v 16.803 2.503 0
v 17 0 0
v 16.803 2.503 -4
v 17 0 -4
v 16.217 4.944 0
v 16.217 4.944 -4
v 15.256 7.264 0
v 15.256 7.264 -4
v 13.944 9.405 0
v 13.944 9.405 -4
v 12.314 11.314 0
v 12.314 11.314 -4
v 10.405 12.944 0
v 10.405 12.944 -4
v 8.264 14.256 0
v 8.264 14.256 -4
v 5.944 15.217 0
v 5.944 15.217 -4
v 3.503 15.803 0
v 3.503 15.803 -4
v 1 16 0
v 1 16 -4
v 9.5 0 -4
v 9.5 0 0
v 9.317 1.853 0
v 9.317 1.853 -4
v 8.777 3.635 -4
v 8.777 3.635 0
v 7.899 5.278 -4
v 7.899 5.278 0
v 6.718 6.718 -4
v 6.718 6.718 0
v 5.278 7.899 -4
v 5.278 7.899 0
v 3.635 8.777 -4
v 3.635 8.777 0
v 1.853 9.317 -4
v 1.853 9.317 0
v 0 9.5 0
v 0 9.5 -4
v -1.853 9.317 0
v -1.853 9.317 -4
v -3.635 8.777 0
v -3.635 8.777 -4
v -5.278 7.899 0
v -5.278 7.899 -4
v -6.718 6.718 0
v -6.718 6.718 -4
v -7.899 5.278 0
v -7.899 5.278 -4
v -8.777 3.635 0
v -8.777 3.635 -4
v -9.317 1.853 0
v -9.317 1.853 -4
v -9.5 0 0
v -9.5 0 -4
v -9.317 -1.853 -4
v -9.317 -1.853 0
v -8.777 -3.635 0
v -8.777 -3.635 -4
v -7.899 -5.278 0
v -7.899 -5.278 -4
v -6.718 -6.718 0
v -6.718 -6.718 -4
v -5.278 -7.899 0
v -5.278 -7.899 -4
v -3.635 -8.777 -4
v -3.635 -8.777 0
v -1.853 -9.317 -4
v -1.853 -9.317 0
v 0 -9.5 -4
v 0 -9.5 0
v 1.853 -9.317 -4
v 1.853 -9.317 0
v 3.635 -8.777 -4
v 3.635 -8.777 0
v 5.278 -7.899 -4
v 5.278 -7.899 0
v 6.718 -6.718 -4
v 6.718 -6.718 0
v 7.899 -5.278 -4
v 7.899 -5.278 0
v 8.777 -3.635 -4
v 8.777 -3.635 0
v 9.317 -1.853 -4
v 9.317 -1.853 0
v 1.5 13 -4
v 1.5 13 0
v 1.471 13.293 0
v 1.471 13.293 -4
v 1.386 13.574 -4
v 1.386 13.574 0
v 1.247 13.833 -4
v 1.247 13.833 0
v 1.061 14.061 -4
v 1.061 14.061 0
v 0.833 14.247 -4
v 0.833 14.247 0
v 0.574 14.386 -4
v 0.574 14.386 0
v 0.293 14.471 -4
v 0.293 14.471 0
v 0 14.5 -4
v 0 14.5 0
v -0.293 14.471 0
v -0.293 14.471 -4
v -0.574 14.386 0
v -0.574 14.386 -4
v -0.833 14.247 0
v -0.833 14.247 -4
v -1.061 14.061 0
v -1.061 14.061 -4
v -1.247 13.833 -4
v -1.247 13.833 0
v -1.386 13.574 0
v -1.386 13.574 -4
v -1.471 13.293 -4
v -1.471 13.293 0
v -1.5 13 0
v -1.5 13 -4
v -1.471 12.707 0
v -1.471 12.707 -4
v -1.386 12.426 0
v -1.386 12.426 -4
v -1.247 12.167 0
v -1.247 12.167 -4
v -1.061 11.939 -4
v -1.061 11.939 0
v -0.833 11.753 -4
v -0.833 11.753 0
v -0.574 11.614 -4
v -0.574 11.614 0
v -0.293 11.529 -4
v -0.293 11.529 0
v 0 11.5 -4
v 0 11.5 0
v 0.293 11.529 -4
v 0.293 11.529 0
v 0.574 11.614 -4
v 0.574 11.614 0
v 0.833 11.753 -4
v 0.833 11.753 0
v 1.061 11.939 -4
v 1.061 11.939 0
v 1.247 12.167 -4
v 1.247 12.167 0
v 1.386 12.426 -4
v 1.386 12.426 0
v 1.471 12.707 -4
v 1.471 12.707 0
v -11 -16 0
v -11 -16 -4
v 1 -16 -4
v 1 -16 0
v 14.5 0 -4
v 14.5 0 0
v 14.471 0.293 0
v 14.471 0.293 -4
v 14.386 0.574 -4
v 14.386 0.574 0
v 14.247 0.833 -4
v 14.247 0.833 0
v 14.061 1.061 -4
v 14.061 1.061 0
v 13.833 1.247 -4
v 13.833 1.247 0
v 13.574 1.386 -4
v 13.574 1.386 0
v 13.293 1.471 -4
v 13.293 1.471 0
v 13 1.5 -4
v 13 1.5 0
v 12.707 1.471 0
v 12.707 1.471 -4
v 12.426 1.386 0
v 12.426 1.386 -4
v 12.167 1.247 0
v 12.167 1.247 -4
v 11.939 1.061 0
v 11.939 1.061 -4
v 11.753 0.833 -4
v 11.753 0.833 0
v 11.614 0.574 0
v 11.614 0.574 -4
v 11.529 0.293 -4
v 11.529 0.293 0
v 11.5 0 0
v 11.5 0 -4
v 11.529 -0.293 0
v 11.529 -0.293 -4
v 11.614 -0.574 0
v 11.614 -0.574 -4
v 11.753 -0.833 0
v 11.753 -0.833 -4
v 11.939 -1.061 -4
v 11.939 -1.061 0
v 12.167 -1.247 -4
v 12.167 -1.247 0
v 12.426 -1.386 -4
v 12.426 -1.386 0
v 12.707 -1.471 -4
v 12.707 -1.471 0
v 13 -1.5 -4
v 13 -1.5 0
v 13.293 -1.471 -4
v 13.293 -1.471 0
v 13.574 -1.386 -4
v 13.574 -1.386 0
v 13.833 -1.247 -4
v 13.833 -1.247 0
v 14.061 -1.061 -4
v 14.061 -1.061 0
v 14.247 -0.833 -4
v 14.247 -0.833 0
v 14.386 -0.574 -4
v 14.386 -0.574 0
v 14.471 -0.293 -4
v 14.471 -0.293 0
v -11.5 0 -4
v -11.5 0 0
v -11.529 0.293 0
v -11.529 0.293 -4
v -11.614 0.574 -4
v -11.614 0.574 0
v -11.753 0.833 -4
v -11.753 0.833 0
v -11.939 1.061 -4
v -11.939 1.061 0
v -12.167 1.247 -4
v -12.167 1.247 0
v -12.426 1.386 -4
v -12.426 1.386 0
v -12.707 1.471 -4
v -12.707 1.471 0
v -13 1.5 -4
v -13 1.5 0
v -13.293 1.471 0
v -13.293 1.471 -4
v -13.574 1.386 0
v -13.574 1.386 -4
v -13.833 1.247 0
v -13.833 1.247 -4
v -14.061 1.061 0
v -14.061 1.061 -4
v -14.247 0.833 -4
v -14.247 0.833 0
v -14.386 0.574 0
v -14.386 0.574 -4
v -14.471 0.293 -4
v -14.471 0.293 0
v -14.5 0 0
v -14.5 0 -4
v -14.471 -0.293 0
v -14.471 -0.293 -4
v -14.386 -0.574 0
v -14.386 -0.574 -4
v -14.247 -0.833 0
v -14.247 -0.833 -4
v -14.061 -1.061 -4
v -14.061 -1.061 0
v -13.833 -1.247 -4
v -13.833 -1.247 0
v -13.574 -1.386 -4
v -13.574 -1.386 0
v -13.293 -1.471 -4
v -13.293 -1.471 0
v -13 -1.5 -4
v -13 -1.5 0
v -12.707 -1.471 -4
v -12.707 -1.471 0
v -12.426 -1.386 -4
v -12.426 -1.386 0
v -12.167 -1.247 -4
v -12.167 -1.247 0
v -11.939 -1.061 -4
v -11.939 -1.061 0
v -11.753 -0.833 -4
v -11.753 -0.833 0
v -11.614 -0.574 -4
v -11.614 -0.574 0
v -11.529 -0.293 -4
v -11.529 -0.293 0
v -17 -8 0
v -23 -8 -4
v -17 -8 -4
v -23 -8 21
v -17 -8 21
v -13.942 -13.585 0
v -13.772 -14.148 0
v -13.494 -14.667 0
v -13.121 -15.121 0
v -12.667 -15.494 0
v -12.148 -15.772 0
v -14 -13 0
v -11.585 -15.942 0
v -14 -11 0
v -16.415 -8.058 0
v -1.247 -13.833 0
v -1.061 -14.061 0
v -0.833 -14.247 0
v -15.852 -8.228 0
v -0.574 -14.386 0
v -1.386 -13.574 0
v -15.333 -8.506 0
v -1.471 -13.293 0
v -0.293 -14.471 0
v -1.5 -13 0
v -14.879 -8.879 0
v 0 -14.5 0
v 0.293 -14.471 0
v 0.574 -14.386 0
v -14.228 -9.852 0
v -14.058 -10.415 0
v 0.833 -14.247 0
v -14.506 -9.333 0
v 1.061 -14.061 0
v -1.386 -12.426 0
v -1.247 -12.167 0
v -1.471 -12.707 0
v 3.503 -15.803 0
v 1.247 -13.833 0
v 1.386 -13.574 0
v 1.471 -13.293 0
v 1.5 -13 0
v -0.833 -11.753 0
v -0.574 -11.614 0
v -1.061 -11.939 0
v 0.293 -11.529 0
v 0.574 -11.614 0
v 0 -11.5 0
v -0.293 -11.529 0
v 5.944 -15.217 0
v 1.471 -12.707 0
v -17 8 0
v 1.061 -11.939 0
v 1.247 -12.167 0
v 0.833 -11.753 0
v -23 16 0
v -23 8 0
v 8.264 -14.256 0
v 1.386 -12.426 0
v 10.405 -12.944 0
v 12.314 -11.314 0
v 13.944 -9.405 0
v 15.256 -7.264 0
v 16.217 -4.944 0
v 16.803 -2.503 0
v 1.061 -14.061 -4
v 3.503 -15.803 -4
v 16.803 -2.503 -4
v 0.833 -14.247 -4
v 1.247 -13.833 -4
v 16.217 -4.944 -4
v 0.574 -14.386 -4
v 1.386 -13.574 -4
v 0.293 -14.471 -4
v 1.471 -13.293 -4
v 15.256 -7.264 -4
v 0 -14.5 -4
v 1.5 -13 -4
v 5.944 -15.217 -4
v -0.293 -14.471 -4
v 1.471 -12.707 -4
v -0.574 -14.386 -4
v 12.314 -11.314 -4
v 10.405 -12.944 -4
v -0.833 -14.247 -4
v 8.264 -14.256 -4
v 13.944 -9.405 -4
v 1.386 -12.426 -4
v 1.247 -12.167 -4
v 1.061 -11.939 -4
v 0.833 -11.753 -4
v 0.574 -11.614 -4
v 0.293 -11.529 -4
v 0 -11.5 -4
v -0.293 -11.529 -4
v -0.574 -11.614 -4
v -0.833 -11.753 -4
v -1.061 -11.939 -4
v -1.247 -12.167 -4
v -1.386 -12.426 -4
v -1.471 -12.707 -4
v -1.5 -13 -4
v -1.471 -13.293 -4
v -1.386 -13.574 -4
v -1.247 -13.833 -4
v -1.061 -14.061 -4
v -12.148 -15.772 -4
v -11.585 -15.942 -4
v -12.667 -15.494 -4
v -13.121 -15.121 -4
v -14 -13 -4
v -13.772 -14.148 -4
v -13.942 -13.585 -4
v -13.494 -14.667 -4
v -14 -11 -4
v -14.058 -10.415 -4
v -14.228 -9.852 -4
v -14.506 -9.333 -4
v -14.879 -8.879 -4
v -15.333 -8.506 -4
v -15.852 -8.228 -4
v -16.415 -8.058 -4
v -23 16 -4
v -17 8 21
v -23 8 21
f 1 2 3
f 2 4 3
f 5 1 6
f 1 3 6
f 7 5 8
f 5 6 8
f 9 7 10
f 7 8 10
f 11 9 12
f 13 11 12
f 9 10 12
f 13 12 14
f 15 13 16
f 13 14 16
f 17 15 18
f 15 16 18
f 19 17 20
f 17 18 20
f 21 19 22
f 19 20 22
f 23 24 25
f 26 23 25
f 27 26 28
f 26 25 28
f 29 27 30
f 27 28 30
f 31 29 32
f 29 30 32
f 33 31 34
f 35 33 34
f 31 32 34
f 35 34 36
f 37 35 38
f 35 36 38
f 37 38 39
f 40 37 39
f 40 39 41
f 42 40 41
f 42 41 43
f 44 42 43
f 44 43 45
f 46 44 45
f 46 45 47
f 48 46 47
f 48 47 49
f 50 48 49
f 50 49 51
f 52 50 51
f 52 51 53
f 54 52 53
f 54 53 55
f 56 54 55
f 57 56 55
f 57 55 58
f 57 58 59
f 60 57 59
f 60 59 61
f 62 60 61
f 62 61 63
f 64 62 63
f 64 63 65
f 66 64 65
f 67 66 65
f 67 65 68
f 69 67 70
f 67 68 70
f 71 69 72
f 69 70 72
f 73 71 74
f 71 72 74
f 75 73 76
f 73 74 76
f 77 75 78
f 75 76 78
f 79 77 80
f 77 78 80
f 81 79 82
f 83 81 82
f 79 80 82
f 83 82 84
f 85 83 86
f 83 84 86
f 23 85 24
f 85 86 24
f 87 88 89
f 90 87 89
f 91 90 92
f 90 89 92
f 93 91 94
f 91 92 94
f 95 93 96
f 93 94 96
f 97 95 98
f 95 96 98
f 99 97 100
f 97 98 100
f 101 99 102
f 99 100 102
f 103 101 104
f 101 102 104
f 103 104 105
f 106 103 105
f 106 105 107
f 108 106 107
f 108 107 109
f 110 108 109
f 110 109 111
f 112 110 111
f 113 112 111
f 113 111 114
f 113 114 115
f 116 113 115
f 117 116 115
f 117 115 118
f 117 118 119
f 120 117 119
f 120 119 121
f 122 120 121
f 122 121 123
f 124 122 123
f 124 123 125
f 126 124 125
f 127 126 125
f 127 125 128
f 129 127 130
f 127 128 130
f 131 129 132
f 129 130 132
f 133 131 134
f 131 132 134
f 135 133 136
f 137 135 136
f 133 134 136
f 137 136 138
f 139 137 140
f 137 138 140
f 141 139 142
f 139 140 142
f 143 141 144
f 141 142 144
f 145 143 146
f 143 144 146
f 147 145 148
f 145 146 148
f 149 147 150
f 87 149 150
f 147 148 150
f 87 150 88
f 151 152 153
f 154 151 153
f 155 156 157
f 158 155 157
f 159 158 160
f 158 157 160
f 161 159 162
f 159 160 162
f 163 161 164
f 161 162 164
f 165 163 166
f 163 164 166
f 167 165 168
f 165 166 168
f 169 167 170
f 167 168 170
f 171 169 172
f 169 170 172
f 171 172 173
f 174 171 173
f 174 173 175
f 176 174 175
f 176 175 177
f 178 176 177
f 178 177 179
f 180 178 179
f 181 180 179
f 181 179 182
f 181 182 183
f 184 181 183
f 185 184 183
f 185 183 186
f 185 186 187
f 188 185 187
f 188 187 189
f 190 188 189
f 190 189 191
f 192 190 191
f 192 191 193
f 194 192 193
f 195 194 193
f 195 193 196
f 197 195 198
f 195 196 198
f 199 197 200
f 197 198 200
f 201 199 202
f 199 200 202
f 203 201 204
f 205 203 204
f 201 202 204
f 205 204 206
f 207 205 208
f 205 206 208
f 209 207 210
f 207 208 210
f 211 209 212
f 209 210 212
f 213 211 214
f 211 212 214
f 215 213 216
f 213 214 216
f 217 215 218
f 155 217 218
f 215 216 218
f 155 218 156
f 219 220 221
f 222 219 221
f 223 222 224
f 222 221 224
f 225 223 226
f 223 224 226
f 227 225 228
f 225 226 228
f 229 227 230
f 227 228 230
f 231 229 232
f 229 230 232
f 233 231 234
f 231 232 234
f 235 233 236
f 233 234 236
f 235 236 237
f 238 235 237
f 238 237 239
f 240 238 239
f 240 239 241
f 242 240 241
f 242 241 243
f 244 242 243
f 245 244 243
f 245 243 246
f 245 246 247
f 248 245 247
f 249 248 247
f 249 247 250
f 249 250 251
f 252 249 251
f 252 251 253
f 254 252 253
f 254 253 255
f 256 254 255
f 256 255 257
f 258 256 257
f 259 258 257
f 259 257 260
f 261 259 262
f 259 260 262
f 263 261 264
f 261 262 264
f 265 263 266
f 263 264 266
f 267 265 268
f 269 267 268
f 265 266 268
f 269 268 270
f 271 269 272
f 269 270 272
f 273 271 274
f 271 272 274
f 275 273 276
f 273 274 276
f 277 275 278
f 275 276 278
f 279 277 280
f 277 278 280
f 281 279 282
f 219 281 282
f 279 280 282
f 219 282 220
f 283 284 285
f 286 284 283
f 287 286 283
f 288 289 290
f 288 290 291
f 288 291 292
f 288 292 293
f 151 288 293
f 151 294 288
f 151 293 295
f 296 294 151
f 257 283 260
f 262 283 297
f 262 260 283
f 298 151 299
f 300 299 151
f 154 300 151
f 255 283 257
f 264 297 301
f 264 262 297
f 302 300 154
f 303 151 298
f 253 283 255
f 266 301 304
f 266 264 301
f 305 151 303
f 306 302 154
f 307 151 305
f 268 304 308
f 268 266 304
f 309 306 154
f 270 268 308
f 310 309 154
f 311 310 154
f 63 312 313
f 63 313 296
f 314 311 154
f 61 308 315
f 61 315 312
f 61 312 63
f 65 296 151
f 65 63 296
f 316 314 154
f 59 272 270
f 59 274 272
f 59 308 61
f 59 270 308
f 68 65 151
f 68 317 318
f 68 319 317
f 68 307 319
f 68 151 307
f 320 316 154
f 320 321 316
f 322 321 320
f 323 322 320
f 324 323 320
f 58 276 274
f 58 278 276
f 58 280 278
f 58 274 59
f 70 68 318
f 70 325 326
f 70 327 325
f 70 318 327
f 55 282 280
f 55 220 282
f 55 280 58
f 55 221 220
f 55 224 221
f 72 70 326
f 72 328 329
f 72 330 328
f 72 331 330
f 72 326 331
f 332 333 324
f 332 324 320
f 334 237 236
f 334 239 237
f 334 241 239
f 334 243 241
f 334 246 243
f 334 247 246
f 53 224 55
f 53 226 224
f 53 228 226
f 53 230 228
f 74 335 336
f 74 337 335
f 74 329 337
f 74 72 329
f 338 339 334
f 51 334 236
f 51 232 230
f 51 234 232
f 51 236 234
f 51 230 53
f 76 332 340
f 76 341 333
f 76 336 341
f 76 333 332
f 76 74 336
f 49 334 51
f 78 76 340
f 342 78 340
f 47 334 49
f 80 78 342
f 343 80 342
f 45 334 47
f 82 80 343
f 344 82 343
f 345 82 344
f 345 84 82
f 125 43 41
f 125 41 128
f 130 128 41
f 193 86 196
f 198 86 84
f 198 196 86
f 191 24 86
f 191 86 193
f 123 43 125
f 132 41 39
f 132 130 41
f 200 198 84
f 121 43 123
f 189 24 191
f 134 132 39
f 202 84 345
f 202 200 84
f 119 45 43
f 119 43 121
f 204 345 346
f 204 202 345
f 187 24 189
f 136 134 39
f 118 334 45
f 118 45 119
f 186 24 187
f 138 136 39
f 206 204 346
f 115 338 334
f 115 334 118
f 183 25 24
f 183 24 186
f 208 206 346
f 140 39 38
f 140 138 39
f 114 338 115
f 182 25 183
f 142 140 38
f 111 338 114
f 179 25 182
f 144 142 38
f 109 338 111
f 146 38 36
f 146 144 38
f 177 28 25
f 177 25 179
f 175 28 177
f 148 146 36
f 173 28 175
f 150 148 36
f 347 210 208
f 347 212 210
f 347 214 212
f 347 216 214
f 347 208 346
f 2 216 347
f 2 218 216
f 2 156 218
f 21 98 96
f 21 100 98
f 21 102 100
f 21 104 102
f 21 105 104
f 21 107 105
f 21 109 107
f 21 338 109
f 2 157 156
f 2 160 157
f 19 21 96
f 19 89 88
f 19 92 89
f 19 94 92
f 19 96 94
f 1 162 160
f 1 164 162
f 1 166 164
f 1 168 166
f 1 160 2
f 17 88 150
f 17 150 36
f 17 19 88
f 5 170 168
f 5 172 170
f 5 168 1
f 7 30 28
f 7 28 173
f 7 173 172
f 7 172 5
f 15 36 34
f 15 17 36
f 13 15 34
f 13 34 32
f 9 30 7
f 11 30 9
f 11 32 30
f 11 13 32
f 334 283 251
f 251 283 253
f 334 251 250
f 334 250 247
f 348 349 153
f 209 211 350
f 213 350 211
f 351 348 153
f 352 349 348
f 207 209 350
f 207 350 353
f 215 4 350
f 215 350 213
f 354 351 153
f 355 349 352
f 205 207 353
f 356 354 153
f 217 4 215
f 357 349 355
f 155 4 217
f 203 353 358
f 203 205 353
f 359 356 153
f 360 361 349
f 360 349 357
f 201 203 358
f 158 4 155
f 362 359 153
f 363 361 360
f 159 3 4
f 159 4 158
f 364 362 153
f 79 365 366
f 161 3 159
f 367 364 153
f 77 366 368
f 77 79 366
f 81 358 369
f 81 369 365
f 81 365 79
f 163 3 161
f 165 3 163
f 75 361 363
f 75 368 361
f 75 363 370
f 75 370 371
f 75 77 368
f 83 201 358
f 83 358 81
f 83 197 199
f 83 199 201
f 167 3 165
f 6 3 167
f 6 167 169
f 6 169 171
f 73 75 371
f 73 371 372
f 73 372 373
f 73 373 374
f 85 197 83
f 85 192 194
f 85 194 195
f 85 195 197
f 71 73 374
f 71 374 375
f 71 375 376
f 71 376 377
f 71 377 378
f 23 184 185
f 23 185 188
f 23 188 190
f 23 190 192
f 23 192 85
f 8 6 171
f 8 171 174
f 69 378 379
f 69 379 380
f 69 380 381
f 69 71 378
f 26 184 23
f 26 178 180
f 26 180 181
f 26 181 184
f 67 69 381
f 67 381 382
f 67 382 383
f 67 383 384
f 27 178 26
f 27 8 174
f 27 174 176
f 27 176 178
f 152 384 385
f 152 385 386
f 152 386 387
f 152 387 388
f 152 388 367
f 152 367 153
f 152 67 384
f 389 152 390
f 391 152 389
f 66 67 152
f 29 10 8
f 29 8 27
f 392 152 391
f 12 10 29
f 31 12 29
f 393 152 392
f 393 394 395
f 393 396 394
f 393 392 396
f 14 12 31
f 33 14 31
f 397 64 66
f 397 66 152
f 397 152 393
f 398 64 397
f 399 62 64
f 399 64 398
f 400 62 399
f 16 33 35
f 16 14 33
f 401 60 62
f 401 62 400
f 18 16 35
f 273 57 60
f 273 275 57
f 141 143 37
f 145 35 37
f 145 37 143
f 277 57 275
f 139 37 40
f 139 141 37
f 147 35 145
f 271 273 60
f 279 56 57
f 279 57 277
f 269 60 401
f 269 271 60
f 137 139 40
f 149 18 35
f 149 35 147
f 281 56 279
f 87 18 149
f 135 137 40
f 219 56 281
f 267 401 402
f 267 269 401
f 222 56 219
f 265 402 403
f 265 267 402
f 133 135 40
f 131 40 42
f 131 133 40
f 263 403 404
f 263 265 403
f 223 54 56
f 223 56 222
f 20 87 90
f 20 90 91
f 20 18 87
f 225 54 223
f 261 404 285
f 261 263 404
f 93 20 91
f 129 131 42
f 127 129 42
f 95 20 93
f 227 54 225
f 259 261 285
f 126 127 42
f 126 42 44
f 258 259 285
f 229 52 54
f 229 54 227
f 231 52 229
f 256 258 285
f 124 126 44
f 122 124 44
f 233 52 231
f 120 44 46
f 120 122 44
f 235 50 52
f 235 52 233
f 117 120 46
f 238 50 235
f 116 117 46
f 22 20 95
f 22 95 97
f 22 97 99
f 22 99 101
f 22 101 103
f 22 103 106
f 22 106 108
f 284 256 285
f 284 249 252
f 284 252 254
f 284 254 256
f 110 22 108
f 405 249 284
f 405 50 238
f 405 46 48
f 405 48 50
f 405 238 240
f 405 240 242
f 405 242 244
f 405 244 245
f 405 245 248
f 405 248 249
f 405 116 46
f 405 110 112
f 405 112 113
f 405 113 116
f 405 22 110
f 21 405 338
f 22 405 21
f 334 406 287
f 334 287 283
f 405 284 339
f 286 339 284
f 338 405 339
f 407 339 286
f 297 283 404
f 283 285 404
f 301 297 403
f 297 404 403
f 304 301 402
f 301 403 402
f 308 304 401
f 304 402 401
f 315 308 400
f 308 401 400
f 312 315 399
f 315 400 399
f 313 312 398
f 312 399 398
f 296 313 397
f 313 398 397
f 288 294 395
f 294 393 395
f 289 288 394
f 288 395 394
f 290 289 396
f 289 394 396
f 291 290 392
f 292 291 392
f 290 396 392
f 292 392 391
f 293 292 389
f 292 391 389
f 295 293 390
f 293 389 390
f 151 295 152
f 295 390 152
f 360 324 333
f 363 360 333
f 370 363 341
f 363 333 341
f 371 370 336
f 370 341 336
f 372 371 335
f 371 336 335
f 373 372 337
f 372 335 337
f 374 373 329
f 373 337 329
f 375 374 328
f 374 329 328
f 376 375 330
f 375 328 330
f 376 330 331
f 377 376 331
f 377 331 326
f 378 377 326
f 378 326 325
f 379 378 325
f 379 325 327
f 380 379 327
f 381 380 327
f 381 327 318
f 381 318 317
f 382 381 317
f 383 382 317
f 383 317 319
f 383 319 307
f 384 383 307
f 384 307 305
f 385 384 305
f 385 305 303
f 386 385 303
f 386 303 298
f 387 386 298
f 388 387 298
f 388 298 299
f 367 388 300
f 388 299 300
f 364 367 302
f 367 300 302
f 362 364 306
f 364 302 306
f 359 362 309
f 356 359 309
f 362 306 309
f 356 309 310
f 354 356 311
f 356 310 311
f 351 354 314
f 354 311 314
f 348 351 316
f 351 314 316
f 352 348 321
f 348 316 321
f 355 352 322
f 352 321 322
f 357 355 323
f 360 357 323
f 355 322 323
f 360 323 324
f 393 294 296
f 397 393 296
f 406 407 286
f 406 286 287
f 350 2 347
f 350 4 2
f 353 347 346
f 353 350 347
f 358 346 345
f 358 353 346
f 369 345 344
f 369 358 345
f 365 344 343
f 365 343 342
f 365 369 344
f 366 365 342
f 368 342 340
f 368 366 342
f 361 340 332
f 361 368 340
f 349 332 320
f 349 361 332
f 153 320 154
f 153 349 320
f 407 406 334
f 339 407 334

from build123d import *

# Parameters (mm, degrees)
BOSS_EXTRUDE1_DEPTH      = 16
SKETCH2_W                = 21
SKETCH2_H                = 8
CUT_EXTRUDE1_DEPTH       = 44.0464865
SKETCH3_R                = 9.5
CUT_EXTRUDE2_DEPTH       = 36.0142828
FILLET1_R                = 16
F_3_0_3_DIAMETER_HOLE1_D = 3
SKETCH6_W                = 9
SKETCH6_H                = 8
CUT_EXTRUDE3_DEPTH       = 36.0142828
FILLET2_R                = 3


with BuildPart() as part:
    # Sketch1 → Boss-Extrude1 (new, symmetric)
    with BuildSketch(Plane(origin=(0, 0, 0), x_dir=(1, 0, 0), z_dir=(0, 1, 0))):
        Polygon((-17, 0), (17, 0), (17, 4), (-23, 4), (-23, -21), (-17, -21), align=None)
    extrude(amount=BOSS_EXTRUDE1_DEPTH, both=True)

    # Sketch2 → Cut-Extrude1 (cut, through all)
    with BuildSketch(Plane(origin=(-17, 0, 0), x_dir=(0, 0, -1), z_dir=(1, 0, 0))):
        with Locations((-10.5, 12)):
            Rectangle(SKETCH2_W, SKETCH2_H)
        with Locations((-10.5, -12)):
            Rectangle(SKETCH2_W, SKETCH2_H)
    extrude(amount=-CUT_EXTRUDE1_DEPTH, mode=Mode.SUBTRACT)

    # Sketch3 → Cut-Extrude2 (cut, through all)
    with BuildSketch(Plane.XY):
        Circle(SKETCH3_R)
    extrude(amount=-CUT_EXTRUDE2_DEPTH, mode=Mode.SUBTRACT)

    # Fillet1
    fillet1_edges = [part.edges().sort_by_distance(p)[0] for p in [
        (17, -16, -2),
        (17, 16, -2),
    ]]
    fillet(fillet1_edges, radius=FILLET1_R - 0.0001)  # a hair under: the kernel refuses the full size

    # Ø3.0 (3) Diameter Hole1 (through all)
    with Locations(Plane(origin=(0, 0, -4), x_dir=(-1, 0, 0), z_dir=(0, 0, -1))):
        with Locations((0, 13), (13, 0), (0, -13), (-13, 0)):
            Hole(F_3_0_3_DIAMETER_HOLE1_D / 2)

    # Sketch6 → Cut-Extrude3 (cut, through all)
    with BuildSketch(Plane.XY):
        with Locations((-18.5, -12)):
            Rectangle(SKETCH6_W, SKETCH6_H)
    extrude(amount=-CUT_EXTRUDE3_DEPTH, mode=Mode.SUBTRACT)

    # Fillet2
    fillet2_edges = [part.edges().sort_by_distance(p)[0] for p in [
        (-14, -16, -2),
        (-14, -8, -2),
    ]]
    fillet(fillet2_edges, radius=FILLET2_R)


solid = part.part
